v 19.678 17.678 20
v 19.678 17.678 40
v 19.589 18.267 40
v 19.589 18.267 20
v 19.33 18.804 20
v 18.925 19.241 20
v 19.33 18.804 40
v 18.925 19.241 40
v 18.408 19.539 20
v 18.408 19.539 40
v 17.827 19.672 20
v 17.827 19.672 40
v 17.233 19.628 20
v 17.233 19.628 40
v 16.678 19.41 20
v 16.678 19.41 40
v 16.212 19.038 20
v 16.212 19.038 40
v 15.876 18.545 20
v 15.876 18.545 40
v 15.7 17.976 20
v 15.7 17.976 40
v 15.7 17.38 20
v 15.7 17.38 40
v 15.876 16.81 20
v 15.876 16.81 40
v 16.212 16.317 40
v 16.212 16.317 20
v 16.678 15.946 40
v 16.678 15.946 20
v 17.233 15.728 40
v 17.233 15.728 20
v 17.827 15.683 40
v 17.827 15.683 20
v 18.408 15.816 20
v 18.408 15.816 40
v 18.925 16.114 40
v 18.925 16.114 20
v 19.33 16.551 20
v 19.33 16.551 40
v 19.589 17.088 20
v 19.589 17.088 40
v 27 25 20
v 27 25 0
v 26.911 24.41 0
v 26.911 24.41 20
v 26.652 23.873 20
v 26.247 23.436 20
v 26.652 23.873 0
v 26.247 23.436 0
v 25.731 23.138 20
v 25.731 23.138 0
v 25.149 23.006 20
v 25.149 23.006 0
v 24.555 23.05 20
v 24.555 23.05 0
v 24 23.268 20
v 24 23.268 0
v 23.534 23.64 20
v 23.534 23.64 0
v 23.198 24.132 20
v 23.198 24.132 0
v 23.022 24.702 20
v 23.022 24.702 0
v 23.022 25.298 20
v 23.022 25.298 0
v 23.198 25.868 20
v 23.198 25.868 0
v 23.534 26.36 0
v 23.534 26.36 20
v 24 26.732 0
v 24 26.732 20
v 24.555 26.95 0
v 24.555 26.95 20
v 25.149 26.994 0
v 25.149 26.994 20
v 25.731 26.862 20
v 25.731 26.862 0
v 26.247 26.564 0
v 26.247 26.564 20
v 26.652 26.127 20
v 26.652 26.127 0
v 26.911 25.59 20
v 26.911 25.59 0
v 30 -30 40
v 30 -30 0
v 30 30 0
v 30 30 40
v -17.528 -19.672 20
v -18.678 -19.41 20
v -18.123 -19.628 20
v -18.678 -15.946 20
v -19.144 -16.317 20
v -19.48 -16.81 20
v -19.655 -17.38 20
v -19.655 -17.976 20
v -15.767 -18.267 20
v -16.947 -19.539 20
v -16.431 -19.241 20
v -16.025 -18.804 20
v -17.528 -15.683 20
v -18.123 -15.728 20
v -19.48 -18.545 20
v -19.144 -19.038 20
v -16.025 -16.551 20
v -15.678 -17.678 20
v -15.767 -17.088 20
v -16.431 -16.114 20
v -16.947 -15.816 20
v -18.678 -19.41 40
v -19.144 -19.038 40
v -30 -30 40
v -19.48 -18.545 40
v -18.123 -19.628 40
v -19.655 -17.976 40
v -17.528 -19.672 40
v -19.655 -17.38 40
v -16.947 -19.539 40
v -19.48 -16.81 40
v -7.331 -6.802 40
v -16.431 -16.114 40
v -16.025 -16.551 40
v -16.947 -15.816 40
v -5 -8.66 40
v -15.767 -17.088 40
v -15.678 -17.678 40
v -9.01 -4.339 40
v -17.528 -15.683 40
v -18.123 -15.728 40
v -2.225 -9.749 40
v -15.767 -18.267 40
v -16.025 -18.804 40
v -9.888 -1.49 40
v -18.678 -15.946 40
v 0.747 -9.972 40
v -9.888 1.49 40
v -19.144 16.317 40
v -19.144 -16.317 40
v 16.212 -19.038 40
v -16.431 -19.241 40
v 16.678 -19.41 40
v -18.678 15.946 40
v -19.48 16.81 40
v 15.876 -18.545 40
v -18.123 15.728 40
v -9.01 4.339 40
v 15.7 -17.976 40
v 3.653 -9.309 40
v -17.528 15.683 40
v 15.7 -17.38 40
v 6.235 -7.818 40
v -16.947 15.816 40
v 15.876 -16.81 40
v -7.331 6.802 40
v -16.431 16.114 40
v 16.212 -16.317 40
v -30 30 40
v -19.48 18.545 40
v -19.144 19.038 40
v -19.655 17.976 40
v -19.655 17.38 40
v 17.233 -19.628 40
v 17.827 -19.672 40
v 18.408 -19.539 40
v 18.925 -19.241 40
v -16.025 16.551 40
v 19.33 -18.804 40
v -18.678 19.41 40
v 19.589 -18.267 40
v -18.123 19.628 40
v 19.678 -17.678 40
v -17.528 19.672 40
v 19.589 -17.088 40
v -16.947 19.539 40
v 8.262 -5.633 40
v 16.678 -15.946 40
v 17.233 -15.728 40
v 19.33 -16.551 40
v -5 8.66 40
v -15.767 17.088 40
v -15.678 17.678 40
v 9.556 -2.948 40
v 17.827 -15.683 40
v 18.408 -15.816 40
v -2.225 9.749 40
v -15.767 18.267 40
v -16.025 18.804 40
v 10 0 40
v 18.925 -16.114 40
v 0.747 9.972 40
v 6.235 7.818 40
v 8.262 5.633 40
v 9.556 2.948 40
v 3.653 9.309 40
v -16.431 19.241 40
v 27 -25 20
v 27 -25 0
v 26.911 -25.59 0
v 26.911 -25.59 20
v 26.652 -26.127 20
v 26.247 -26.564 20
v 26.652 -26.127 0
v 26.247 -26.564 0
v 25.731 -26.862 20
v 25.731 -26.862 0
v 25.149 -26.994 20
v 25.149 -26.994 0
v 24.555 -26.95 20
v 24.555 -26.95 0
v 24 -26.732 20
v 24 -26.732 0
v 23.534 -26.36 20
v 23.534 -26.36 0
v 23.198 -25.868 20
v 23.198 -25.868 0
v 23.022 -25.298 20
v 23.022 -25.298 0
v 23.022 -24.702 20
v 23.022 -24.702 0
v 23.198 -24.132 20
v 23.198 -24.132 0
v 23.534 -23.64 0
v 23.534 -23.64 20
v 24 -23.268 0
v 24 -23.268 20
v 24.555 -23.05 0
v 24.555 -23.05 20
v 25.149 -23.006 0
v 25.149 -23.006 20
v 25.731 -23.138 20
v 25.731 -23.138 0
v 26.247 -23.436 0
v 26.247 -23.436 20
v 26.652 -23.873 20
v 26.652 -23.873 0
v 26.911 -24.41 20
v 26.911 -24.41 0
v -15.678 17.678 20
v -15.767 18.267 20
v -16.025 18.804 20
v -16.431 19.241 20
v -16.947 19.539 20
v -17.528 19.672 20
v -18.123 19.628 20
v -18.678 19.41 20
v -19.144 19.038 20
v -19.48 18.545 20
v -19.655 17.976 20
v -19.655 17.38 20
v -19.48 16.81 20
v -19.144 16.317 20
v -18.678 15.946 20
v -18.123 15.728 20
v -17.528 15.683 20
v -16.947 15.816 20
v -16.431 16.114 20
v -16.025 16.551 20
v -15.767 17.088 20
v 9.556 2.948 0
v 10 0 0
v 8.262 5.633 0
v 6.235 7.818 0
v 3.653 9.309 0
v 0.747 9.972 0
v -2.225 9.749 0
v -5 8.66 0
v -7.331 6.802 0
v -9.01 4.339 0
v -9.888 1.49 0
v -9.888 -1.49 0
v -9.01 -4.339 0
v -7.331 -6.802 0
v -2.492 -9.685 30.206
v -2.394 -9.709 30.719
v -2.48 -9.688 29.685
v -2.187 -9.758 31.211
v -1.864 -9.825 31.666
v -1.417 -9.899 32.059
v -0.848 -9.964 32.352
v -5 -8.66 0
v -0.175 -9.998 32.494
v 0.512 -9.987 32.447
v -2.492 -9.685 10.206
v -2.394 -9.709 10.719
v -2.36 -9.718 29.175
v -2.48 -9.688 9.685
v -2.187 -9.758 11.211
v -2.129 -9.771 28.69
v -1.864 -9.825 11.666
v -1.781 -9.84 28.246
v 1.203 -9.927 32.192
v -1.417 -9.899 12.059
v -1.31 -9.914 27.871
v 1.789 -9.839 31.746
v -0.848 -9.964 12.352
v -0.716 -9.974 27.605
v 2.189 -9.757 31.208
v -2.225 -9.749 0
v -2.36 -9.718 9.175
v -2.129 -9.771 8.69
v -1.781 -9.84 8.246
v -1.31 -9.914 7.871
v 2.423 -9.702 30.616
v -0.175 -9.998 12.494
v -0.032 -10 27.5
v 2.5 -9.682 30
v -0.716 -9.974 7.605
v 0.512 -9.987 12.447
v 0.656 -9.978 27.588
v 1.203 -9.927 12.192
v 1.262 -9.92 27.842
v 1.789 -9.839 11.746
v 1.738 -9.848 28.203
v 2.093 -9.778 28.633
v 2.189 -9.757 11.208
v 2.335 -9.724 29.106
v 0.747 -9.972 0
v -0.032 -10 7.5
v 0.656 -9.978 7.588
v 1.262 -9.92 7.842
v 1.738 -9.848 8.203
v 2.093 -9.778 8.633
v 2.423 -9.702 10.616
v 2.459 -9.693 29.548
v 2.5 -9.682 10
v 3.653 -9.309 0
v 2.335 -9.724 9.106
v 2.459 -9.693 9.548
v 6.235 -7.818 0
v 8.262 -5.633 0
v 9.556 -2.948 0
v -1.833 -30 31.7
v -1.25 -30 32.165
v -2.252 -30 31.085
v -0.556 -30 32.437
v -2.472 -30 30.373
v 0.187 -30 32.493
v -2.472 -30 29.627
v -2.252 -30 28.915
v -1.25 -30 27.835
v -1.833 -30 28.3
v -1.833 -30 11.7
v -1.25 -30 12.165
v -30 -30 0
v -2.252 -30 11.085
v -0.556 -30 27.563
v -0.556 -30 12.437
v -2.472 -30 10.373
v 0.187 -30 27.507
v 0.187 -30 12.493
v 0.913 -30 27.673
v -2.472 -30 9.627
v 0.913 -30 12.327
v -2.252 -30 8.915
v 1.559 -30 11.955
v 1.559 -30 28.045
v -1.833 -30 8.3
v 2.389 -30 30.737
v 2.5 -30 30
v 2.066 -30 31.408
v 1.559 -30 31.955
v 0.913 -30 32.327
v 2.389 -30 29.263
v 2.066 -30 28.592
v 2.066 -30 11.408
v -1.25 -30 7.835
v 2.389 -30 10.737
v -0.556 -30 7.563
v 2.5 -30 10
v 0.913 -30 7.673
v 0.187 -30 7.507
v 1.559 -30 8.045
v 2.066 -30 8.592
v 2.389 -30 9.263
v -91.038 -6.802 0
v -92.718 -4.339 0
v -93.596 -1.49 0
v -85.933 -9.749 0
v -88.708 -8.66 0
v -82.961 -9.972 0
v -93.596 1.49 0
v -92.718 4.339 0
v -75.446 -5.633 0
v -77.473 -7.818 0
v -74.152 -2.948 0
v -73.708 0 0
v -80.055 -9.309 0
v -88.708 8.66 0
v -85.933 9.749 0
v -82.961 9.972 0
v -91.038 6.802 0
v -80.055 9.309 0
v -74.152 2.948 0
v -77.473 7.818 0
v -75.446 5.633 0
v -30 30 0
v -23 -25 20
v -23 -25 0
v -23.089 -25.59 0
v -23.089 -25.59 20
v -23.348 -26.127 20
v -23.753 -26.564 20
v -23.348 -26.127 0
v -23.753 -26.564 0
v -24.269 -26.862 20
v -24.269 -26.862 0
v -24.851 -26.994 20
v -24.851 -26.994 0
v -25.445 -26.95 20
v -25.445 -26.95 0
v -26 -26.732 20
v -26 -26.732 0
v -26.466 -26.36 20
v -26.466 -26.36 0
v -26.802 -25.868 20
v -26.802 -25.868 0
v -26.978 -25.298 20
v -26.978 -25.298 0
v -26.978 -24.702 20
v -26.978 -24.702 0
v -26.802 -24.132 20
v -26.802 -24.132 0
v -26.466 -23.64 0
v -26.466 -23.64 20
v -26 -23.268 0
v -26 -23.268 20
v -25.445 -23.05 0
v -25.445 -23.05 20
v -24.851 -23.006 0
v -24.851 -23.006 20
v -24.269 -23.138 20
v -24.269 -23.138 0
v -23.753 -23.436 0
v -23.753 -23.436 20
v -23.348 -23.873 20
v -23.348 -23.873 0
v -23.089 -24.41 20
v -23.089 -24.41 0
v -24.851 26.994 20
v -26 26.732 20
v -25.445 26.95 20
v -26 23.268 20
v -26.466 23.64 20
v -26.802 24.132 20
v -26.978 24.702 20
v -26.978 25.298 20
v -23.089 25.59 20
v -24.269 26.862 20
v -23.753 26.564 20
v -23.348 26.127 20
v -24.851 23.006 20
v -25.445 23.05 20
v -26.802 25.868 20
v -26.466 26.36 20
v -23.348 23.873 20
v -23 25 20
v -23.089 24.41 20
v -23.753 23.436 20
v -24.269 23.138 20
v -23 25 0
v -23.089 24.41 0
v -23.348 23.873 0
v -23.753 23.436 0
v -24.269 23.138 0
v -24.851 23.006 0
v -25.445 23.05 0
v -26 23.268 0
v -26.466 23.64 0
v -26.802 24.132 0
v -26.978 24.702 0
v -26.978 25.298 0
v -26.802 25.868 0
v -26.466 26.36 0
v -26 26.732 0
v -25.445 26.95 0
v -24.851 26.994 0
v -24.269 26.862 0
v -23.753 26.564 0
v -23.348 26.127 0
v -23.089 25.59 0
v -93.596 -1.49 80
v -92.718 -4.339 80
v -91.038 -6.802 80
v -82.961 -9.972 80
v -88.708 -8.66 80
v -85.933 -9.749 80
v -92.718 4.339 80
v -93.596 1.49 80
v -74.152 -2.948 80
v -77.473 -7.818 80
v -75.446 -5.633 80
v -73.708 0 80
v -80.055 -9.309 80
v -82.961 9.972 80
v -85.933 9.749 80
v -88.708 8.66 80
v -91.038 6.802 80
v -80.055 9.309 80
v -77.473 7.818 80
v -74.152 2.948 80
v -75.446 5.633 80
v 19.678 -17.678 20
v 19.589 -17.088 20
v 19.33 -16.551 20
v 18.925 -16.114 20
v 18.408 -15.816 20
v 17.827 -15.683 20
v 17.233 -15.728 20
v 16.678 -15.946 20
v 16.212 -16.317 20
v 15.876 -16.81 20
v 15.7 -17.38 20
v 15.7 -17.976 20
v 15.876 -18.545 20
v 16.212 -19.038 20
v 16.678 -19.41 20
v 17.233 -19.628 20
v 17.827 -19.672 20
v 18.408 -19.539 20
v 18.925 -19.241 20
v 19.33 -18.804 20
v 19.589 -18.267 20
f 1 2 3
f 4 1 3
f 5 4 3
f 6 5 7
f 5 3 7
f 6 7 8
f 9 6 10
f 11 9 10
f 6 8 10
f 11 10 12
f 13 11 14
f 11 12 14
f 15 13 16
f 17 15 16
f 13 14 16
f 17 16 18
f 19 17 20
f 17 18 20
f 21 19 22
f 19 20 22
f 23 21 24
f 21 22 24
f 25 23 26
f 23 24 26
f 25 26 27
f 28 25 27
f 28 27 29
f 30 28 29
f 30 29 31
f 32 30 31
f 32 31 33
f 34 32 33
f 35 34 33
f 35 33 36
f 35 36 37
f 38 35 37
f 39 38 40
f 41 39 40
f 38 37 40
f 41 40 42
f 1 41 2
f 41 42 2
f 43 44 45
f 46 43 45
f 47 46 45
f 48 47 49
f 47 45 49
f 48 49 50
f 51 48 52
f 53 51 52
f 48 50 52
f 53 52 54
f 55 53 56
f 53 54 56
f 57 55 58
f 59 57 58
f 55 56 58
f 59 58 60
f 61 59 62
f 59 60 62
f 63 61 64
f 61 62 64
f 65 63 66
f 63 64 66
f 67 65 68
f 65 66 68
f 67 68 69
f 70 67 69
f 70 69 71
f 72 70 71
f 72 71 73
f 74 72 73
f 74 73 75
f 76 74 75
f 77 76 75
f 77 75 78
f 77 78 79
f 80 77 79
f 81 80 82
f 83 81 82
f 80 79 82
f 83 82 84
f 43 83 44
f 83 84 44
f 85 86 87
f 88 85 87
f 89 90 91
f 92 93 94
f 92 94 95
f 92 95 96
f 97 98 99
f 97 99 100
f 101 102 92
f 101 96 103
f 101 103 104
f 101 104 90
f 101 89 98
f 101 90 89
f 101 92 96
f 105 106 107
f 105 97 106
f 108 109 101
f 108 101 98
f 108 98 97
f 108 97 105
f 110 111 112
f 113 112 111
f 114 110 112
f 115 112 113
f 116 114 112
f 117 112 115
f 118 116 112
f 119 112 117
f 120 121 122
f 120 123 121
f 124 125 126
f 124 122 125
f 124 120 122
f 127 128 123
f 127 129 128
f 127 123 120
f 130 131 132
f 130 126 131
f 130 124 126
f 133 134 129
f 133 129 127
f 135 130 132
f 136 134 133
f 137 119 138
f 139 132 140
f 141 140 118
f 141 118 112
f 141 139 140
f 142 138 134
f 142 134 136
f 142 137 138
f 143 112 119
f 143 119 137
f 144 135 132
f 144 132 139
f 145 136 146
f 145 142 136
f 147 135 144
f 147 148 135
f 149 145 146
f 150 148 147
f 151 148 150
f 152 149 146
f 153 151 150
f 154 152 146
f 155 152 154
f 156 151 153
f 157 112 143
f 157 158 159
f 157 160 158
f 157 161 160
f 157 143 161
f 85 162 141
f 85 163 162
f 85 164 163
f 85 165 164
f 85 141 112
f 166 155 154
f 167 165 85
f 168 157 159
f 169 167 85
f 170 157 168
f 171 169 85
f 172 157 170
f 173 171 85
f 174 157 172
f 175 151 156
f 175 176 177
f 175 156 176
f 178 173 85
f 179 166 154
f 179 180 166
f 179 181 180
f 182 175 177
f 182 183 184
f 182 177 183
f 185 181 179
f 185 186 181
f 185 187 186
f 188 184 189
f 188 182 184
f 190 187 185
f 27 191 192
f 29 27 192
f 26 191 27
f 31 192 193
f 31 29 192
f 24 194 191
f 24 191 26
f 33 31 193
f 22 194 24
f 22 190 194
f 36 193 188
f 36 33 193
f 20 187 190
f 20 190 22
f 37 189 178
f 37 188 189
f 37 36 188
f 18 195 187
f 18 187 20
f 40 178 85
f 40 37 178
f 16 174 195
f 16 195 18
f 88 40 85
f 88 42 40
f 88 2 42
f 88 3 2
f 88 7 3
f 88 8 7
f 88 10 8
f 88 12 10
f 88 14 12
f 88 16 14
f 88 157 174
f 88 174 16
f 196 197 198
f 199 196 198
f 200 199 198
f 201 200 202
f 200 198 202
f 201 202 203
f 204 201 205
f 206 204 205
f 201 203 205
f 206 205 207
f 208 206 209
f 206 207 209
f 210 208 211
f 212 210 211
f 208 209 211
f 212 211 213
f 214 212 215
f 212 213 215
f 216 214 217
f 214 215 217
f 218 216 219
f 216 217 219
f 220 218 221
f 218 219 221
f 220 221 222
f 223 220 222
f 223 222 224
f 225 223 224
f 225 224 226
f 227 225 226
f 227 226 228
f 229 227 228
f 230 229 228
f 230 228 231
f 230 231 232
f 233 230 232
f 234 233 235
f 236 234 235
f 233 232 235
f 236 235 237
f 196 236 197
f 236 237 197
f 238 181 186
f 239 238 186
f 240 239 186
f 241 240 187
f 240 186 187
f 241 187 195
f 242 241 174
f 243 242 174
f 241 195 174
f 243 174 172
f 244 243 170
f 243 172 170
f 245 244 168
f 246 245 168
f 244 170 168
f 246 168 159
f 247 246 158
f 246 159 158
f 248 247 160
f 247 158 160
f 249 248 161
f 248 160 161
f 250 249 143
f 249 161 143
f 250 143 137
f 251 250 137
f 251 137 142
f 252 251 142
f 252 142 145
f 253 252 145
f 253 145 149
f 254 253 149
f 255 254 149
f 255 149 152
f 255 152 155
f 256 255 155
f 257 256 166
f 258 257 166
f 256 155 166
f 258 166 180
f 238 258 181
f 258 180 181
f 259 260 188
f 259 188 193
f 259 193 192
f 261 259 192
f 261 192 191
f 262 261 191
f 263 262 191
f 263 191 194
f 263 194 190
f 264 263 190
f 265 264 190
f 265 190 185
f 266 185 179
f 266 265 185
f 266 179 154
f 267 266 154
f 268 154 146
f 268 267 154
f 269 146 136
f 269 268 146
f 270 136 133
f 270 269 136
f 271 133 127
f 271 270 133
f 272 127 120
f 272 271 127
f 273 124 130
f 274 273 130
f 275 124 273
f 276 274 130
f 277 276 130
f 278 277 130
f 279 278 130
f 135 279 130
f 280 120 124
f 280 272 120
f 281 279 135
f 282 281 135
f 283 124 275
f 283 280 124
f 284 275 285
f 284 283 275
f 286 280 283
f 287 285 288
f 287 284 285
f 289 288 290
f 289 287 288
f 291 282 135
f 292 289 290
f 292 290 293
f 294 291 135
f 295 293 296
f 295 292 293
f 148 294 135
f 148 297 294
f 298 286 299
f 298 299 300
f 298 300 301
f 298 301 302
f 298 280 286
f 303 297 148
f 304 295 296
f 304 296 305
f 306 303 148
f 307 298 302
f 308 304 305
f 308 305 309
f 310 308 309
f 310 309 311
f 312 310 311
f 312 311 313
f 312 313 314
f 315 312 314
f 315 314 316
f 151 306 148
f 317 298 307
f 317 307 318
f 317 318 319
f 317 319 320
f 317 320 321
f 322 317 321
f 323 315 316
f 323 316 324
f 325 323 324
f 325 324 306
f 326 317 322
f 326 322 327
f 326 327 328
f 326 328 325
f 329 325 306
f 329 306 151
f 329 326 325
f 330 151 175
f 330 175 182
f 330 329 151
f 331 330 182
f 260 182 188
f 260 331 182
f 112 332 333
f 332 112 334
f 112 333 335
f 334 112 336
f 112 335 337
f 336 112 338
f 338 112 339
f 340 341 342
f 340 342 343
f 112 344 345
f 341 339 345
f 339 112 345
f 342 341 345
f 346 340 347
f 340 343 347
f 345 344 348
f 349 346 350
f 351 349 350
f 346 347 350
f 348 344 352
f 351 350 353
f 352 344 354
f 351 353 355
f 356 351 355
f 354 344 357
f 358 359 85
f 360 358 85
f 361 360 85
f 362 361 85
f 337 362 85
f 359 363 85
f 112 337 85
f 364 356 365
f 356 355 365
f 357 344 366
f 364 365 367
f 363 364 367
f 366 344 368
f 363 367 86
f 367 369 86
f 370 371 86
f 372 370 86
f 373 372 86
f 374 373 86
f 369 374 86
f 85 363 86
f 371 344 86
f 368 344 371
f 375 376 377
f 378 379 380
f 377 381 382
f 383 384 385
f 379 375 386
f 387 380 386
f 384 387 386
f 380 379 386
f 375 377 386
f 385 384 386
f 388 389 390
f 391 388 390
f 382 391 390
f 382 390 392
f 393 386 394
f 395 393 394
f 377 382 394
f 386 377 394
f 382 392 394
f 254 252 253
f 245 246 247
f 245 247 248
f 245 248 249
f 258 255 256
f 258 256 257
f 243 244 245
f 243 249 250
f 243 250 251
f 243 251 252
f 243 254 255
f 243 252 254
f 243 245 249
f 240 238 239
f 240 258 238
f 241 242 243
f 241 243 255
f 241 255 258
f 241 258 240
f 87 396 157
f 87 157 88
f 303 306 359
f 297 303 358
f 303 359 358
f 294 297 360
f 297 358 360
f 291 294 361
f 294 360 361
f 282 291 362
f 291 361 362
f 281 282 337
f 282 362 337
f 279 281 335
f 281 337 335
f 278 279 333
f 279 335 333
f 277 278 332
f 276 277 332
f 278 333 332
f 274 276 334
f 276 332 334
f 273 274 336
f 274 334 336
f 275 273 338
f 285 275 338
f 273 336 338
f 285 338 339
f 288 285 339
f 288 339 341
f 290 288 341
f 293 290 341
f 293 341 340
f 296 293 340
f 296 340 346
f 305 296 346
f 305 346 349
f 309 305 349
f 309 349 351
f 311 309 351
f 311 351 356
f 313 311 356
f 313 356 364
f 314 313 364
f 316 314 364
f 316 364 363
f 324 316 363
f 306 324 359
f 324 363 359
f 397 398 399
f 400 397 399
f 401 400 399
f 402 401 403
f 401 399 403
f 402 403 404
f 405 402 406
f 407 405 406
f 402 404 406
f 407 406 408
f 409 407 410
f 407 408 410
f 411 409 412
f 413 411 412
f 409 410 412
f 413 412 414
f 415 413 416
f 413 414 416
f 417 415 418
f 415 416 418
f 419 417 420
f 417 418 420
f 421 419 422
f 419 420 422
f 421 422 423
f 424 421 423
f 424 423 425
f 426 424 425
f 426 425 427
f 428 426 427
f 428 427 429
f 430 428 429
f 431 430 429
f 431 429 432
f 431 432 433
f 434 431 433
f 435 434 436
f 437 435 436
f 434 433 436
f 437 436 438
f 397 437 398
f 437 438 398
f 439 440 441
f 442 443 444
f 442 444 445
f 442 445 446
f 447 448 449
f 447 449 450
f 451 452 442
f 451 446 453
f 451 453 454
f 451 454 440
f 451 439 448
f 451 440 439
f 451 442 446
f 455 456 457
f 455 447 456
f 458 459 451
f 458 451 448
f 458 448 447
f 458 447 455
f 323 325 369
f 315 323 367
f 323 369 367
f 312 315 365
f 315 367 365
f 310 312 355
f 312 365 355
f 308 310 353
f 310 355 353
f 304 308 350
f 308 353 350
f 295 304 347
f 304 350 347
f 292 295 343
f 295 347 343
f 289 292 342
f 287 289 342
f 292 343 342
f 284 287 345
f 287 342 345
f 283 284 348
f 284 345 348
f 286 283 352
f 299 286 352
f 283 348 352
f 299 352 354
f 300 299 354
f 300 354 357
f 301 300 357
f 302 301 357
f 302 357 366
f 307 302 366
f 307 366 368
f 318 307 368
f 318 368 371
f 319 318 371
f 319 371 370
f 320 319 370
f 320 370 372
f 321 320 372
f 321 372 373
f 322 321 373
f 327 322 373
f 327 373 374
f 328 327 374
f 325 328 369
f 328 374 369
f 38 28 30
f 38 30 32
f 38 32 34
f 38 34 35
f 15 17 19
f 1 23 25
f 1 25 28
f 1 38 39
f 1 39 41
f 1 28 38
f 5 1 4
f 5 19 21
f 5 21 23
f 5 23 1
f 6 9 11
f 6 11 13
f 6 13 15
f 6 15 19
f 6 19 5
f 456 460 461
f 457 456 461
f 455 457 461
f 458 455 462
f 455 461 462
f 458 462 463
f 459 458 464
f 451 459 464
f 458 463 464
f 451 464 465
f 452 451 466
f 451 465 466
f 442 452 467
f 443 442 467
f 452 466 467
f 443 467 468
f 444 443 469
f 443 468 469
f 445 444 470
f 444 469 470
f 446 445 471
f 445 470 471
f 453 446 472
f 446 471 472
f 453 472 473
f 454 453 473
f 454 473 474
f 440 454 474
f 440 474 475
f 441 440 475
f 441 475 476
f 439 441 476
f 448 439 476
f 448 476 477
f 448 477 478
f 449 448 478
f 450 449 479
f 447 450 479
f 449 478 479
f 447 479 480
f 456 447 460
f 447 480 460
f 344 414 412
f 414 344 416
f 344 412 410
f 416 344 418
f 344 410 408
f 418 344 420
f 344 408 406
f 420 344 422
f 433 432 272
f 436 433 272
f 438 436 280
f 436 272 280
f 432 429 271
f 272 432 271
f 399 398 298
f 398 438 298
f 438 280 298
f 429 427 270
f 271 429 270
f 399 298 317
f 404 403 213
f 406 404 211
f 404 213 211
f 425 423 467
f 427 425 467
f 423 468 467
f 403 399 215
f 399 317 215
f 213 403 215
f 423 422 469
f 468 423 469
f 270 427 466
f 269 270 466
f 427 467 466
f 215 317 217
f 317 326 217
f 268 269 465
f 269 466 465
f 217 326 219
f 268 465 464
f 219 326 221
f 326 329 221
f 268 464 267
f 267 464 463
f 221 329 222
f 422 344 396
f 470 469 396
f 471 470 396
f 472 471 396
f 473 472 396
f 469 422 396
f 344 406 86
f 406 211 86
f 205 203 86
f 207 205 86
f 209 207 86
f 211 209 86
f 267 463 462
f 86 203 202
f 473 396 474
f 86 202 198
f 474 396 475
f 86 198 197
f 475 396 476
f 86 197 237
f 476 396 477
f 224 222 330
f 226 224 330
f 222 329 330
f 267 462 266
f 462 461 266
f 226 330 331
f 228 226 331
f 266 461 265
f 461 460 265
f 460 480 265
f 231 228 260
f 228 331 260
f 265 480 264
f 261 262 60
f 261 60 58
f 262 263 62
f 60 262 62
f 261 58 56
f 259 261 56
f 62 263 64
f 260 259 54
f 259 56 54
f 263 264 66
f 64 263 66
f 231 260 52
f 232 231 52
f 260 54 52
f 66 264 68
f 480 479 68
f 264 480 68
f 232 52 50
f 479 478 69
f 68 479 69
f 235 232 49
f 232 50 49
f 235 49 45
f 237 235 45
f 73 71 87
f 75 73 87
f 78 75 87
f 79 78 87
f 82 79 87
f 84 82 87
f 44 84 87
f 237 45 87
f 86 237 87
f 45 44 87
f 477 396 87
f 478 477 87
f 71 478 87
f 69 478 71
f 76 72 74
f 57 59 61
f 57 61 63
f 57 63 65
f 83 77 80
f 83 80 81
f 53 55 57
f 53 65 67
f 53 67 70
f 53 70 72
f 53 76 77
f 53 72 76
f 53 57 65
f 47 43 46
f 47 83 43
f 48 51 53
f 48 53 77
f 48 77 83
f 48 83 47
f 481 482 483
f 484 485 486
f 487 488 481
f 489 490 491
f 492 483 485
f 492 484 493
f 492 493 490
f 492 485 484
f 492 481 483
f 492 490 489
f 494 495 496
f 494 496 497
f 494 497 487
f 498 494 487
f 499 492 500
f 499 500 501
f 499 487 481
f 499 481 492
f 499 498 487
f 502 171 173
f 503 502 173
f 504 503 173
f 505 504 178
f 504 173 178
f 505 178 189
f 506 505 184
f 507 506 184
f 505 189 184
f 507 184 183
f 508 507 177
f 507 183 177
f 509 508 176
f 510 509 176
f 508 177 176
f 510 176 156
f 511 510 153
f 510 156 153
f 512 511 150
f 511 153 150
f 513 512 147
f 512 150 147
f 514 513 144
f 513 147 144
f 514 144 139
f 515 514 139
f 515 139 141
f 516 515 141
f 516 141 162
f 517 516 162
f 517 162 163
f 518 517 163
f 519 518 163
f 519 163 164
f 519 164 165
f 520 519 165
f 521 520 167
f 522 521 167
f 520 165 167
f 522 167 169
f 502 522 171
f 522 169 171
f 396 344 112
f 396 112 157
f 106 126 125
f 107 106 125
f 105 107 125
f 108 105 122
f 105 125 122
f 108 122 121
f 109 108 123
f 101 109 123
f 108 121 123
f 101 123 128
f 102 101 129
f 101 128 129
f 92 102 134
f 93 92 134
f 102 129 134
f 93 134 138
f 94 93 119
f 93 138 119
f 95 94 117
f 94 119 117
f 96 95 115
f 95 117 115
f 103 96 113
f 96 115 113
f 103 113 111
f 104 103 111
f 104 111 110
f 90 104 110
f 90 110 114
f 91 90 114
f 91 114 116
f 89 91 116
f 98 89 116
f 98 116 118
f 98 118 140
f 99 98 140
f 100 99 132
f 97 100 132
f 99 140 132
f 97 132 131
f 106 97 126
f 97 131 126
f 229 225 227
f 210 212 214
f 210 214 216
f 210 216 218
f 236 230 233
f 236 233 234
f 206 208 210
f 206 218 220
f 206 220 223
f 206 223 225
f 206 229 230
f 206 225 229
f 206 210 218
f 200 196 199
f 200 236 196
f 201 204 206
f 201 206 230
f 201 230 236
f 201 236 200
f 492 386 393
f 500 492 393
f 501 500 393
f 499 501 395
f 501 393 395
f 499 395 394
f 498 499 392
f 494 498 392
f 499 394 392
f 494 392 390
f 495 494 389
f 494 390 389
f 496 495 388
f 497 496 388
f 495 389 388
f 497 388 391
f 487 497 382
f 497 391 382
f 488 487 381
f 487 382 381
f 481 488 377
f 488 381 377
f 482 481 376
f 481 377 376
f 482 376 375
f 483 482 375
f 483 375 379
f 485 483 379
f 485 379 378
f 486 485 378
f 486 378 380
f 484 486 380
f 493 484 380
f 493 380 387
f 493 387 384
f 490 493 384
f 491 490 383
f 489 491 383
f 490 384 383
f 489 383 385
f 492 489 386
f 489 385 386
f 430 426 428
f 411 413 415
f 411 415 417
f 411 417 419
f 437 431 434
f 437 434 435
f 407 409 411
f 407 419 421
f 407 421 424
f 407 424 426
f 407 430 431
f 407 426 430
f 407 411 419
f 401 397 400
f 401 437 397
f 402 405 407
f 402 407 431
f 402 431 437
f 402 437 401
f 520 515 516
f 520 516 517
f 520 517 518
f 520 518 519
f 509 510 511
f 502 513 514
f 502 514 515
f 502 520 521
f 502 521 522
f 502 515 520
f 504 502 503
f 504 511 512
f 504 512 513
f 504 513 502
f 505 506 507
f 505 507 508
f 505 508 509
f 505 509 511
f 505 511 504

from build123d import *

# Parameters (mm, degrees)
F0_W     = 60
F0_H     = 60
F0_R     = 10
F1_DEPTH = 40
F2_R     = 2
F3_DEPTH = 20
F4_R     = 2.5
F5_DEPTH = 25
F6_DEPTH = 80
F7_R     = 2
F8_DEPTH = 20


with BuildPart() as f1:
    # F0 (on Top) → F1 (new body)
    with BuildSketch(Plane.XY):
        Rectangle(F0_W, F0_H)
        Circle(F0_R, mode=Mode.SUBTRACT)
    extrude(amount=F1_DEPTH)

    # F2 (on face) → F3 (cut)
    with BuildSketch(Plane(origin=(0, 0, 0), x_dir=(1, 0, 0), z_dir=(0, 0, -1))):
        with Locations((-25, 25)):
            Circle(F2_R)
        with Locations((25, 25)):
            Circle(F2_R)
        with Locations((-25, -25)):
            Circle(F2_R)
        with Locations((25, -25)):
            Circle(F2_R)
    extrude(amount=-F3_DEPTH, mode=Mode.SUBTRACT)

    # F4 (on face) → F5 (cut)
    with BuildSketch(Plane.XZ.offset(30)):
        with Locations((0, 30)):
            Circle(F4_R)
        with Locations((0, 10)):
            Circle(F4_R)
    extrude(amount=-F5_DEPTH, mode=Mode.SUBTRACT)

    # F7 (on face) → F8 (cut)
    with BuildSketch(Plane.XY.offset(40)):
        with Locations((-17.67767, 17.67767)):
            Circle(F7_R)
        with Locations((-17.67767, -17.67767)):
            Circle(F7_R)
        with Locations((17.67767, -17.67767)):
            Circle(F7_R)
        with Locations((17.67767, 17.67767)):
            Circle(F7_R)
    extrude(amount=-F8_DEPTH, mode=Mode.SUBTRACT)


with BuildPart() as f6:
    # F0 (on Top) → F6 (new body)
    with BuildSketch(Plane.XY):
        with Locations((-83.707973, 0)):
            Circle(F0_R)
    extrude(amount=F6_DEPTH)


solid = Compound([f1.part, f6.part])
